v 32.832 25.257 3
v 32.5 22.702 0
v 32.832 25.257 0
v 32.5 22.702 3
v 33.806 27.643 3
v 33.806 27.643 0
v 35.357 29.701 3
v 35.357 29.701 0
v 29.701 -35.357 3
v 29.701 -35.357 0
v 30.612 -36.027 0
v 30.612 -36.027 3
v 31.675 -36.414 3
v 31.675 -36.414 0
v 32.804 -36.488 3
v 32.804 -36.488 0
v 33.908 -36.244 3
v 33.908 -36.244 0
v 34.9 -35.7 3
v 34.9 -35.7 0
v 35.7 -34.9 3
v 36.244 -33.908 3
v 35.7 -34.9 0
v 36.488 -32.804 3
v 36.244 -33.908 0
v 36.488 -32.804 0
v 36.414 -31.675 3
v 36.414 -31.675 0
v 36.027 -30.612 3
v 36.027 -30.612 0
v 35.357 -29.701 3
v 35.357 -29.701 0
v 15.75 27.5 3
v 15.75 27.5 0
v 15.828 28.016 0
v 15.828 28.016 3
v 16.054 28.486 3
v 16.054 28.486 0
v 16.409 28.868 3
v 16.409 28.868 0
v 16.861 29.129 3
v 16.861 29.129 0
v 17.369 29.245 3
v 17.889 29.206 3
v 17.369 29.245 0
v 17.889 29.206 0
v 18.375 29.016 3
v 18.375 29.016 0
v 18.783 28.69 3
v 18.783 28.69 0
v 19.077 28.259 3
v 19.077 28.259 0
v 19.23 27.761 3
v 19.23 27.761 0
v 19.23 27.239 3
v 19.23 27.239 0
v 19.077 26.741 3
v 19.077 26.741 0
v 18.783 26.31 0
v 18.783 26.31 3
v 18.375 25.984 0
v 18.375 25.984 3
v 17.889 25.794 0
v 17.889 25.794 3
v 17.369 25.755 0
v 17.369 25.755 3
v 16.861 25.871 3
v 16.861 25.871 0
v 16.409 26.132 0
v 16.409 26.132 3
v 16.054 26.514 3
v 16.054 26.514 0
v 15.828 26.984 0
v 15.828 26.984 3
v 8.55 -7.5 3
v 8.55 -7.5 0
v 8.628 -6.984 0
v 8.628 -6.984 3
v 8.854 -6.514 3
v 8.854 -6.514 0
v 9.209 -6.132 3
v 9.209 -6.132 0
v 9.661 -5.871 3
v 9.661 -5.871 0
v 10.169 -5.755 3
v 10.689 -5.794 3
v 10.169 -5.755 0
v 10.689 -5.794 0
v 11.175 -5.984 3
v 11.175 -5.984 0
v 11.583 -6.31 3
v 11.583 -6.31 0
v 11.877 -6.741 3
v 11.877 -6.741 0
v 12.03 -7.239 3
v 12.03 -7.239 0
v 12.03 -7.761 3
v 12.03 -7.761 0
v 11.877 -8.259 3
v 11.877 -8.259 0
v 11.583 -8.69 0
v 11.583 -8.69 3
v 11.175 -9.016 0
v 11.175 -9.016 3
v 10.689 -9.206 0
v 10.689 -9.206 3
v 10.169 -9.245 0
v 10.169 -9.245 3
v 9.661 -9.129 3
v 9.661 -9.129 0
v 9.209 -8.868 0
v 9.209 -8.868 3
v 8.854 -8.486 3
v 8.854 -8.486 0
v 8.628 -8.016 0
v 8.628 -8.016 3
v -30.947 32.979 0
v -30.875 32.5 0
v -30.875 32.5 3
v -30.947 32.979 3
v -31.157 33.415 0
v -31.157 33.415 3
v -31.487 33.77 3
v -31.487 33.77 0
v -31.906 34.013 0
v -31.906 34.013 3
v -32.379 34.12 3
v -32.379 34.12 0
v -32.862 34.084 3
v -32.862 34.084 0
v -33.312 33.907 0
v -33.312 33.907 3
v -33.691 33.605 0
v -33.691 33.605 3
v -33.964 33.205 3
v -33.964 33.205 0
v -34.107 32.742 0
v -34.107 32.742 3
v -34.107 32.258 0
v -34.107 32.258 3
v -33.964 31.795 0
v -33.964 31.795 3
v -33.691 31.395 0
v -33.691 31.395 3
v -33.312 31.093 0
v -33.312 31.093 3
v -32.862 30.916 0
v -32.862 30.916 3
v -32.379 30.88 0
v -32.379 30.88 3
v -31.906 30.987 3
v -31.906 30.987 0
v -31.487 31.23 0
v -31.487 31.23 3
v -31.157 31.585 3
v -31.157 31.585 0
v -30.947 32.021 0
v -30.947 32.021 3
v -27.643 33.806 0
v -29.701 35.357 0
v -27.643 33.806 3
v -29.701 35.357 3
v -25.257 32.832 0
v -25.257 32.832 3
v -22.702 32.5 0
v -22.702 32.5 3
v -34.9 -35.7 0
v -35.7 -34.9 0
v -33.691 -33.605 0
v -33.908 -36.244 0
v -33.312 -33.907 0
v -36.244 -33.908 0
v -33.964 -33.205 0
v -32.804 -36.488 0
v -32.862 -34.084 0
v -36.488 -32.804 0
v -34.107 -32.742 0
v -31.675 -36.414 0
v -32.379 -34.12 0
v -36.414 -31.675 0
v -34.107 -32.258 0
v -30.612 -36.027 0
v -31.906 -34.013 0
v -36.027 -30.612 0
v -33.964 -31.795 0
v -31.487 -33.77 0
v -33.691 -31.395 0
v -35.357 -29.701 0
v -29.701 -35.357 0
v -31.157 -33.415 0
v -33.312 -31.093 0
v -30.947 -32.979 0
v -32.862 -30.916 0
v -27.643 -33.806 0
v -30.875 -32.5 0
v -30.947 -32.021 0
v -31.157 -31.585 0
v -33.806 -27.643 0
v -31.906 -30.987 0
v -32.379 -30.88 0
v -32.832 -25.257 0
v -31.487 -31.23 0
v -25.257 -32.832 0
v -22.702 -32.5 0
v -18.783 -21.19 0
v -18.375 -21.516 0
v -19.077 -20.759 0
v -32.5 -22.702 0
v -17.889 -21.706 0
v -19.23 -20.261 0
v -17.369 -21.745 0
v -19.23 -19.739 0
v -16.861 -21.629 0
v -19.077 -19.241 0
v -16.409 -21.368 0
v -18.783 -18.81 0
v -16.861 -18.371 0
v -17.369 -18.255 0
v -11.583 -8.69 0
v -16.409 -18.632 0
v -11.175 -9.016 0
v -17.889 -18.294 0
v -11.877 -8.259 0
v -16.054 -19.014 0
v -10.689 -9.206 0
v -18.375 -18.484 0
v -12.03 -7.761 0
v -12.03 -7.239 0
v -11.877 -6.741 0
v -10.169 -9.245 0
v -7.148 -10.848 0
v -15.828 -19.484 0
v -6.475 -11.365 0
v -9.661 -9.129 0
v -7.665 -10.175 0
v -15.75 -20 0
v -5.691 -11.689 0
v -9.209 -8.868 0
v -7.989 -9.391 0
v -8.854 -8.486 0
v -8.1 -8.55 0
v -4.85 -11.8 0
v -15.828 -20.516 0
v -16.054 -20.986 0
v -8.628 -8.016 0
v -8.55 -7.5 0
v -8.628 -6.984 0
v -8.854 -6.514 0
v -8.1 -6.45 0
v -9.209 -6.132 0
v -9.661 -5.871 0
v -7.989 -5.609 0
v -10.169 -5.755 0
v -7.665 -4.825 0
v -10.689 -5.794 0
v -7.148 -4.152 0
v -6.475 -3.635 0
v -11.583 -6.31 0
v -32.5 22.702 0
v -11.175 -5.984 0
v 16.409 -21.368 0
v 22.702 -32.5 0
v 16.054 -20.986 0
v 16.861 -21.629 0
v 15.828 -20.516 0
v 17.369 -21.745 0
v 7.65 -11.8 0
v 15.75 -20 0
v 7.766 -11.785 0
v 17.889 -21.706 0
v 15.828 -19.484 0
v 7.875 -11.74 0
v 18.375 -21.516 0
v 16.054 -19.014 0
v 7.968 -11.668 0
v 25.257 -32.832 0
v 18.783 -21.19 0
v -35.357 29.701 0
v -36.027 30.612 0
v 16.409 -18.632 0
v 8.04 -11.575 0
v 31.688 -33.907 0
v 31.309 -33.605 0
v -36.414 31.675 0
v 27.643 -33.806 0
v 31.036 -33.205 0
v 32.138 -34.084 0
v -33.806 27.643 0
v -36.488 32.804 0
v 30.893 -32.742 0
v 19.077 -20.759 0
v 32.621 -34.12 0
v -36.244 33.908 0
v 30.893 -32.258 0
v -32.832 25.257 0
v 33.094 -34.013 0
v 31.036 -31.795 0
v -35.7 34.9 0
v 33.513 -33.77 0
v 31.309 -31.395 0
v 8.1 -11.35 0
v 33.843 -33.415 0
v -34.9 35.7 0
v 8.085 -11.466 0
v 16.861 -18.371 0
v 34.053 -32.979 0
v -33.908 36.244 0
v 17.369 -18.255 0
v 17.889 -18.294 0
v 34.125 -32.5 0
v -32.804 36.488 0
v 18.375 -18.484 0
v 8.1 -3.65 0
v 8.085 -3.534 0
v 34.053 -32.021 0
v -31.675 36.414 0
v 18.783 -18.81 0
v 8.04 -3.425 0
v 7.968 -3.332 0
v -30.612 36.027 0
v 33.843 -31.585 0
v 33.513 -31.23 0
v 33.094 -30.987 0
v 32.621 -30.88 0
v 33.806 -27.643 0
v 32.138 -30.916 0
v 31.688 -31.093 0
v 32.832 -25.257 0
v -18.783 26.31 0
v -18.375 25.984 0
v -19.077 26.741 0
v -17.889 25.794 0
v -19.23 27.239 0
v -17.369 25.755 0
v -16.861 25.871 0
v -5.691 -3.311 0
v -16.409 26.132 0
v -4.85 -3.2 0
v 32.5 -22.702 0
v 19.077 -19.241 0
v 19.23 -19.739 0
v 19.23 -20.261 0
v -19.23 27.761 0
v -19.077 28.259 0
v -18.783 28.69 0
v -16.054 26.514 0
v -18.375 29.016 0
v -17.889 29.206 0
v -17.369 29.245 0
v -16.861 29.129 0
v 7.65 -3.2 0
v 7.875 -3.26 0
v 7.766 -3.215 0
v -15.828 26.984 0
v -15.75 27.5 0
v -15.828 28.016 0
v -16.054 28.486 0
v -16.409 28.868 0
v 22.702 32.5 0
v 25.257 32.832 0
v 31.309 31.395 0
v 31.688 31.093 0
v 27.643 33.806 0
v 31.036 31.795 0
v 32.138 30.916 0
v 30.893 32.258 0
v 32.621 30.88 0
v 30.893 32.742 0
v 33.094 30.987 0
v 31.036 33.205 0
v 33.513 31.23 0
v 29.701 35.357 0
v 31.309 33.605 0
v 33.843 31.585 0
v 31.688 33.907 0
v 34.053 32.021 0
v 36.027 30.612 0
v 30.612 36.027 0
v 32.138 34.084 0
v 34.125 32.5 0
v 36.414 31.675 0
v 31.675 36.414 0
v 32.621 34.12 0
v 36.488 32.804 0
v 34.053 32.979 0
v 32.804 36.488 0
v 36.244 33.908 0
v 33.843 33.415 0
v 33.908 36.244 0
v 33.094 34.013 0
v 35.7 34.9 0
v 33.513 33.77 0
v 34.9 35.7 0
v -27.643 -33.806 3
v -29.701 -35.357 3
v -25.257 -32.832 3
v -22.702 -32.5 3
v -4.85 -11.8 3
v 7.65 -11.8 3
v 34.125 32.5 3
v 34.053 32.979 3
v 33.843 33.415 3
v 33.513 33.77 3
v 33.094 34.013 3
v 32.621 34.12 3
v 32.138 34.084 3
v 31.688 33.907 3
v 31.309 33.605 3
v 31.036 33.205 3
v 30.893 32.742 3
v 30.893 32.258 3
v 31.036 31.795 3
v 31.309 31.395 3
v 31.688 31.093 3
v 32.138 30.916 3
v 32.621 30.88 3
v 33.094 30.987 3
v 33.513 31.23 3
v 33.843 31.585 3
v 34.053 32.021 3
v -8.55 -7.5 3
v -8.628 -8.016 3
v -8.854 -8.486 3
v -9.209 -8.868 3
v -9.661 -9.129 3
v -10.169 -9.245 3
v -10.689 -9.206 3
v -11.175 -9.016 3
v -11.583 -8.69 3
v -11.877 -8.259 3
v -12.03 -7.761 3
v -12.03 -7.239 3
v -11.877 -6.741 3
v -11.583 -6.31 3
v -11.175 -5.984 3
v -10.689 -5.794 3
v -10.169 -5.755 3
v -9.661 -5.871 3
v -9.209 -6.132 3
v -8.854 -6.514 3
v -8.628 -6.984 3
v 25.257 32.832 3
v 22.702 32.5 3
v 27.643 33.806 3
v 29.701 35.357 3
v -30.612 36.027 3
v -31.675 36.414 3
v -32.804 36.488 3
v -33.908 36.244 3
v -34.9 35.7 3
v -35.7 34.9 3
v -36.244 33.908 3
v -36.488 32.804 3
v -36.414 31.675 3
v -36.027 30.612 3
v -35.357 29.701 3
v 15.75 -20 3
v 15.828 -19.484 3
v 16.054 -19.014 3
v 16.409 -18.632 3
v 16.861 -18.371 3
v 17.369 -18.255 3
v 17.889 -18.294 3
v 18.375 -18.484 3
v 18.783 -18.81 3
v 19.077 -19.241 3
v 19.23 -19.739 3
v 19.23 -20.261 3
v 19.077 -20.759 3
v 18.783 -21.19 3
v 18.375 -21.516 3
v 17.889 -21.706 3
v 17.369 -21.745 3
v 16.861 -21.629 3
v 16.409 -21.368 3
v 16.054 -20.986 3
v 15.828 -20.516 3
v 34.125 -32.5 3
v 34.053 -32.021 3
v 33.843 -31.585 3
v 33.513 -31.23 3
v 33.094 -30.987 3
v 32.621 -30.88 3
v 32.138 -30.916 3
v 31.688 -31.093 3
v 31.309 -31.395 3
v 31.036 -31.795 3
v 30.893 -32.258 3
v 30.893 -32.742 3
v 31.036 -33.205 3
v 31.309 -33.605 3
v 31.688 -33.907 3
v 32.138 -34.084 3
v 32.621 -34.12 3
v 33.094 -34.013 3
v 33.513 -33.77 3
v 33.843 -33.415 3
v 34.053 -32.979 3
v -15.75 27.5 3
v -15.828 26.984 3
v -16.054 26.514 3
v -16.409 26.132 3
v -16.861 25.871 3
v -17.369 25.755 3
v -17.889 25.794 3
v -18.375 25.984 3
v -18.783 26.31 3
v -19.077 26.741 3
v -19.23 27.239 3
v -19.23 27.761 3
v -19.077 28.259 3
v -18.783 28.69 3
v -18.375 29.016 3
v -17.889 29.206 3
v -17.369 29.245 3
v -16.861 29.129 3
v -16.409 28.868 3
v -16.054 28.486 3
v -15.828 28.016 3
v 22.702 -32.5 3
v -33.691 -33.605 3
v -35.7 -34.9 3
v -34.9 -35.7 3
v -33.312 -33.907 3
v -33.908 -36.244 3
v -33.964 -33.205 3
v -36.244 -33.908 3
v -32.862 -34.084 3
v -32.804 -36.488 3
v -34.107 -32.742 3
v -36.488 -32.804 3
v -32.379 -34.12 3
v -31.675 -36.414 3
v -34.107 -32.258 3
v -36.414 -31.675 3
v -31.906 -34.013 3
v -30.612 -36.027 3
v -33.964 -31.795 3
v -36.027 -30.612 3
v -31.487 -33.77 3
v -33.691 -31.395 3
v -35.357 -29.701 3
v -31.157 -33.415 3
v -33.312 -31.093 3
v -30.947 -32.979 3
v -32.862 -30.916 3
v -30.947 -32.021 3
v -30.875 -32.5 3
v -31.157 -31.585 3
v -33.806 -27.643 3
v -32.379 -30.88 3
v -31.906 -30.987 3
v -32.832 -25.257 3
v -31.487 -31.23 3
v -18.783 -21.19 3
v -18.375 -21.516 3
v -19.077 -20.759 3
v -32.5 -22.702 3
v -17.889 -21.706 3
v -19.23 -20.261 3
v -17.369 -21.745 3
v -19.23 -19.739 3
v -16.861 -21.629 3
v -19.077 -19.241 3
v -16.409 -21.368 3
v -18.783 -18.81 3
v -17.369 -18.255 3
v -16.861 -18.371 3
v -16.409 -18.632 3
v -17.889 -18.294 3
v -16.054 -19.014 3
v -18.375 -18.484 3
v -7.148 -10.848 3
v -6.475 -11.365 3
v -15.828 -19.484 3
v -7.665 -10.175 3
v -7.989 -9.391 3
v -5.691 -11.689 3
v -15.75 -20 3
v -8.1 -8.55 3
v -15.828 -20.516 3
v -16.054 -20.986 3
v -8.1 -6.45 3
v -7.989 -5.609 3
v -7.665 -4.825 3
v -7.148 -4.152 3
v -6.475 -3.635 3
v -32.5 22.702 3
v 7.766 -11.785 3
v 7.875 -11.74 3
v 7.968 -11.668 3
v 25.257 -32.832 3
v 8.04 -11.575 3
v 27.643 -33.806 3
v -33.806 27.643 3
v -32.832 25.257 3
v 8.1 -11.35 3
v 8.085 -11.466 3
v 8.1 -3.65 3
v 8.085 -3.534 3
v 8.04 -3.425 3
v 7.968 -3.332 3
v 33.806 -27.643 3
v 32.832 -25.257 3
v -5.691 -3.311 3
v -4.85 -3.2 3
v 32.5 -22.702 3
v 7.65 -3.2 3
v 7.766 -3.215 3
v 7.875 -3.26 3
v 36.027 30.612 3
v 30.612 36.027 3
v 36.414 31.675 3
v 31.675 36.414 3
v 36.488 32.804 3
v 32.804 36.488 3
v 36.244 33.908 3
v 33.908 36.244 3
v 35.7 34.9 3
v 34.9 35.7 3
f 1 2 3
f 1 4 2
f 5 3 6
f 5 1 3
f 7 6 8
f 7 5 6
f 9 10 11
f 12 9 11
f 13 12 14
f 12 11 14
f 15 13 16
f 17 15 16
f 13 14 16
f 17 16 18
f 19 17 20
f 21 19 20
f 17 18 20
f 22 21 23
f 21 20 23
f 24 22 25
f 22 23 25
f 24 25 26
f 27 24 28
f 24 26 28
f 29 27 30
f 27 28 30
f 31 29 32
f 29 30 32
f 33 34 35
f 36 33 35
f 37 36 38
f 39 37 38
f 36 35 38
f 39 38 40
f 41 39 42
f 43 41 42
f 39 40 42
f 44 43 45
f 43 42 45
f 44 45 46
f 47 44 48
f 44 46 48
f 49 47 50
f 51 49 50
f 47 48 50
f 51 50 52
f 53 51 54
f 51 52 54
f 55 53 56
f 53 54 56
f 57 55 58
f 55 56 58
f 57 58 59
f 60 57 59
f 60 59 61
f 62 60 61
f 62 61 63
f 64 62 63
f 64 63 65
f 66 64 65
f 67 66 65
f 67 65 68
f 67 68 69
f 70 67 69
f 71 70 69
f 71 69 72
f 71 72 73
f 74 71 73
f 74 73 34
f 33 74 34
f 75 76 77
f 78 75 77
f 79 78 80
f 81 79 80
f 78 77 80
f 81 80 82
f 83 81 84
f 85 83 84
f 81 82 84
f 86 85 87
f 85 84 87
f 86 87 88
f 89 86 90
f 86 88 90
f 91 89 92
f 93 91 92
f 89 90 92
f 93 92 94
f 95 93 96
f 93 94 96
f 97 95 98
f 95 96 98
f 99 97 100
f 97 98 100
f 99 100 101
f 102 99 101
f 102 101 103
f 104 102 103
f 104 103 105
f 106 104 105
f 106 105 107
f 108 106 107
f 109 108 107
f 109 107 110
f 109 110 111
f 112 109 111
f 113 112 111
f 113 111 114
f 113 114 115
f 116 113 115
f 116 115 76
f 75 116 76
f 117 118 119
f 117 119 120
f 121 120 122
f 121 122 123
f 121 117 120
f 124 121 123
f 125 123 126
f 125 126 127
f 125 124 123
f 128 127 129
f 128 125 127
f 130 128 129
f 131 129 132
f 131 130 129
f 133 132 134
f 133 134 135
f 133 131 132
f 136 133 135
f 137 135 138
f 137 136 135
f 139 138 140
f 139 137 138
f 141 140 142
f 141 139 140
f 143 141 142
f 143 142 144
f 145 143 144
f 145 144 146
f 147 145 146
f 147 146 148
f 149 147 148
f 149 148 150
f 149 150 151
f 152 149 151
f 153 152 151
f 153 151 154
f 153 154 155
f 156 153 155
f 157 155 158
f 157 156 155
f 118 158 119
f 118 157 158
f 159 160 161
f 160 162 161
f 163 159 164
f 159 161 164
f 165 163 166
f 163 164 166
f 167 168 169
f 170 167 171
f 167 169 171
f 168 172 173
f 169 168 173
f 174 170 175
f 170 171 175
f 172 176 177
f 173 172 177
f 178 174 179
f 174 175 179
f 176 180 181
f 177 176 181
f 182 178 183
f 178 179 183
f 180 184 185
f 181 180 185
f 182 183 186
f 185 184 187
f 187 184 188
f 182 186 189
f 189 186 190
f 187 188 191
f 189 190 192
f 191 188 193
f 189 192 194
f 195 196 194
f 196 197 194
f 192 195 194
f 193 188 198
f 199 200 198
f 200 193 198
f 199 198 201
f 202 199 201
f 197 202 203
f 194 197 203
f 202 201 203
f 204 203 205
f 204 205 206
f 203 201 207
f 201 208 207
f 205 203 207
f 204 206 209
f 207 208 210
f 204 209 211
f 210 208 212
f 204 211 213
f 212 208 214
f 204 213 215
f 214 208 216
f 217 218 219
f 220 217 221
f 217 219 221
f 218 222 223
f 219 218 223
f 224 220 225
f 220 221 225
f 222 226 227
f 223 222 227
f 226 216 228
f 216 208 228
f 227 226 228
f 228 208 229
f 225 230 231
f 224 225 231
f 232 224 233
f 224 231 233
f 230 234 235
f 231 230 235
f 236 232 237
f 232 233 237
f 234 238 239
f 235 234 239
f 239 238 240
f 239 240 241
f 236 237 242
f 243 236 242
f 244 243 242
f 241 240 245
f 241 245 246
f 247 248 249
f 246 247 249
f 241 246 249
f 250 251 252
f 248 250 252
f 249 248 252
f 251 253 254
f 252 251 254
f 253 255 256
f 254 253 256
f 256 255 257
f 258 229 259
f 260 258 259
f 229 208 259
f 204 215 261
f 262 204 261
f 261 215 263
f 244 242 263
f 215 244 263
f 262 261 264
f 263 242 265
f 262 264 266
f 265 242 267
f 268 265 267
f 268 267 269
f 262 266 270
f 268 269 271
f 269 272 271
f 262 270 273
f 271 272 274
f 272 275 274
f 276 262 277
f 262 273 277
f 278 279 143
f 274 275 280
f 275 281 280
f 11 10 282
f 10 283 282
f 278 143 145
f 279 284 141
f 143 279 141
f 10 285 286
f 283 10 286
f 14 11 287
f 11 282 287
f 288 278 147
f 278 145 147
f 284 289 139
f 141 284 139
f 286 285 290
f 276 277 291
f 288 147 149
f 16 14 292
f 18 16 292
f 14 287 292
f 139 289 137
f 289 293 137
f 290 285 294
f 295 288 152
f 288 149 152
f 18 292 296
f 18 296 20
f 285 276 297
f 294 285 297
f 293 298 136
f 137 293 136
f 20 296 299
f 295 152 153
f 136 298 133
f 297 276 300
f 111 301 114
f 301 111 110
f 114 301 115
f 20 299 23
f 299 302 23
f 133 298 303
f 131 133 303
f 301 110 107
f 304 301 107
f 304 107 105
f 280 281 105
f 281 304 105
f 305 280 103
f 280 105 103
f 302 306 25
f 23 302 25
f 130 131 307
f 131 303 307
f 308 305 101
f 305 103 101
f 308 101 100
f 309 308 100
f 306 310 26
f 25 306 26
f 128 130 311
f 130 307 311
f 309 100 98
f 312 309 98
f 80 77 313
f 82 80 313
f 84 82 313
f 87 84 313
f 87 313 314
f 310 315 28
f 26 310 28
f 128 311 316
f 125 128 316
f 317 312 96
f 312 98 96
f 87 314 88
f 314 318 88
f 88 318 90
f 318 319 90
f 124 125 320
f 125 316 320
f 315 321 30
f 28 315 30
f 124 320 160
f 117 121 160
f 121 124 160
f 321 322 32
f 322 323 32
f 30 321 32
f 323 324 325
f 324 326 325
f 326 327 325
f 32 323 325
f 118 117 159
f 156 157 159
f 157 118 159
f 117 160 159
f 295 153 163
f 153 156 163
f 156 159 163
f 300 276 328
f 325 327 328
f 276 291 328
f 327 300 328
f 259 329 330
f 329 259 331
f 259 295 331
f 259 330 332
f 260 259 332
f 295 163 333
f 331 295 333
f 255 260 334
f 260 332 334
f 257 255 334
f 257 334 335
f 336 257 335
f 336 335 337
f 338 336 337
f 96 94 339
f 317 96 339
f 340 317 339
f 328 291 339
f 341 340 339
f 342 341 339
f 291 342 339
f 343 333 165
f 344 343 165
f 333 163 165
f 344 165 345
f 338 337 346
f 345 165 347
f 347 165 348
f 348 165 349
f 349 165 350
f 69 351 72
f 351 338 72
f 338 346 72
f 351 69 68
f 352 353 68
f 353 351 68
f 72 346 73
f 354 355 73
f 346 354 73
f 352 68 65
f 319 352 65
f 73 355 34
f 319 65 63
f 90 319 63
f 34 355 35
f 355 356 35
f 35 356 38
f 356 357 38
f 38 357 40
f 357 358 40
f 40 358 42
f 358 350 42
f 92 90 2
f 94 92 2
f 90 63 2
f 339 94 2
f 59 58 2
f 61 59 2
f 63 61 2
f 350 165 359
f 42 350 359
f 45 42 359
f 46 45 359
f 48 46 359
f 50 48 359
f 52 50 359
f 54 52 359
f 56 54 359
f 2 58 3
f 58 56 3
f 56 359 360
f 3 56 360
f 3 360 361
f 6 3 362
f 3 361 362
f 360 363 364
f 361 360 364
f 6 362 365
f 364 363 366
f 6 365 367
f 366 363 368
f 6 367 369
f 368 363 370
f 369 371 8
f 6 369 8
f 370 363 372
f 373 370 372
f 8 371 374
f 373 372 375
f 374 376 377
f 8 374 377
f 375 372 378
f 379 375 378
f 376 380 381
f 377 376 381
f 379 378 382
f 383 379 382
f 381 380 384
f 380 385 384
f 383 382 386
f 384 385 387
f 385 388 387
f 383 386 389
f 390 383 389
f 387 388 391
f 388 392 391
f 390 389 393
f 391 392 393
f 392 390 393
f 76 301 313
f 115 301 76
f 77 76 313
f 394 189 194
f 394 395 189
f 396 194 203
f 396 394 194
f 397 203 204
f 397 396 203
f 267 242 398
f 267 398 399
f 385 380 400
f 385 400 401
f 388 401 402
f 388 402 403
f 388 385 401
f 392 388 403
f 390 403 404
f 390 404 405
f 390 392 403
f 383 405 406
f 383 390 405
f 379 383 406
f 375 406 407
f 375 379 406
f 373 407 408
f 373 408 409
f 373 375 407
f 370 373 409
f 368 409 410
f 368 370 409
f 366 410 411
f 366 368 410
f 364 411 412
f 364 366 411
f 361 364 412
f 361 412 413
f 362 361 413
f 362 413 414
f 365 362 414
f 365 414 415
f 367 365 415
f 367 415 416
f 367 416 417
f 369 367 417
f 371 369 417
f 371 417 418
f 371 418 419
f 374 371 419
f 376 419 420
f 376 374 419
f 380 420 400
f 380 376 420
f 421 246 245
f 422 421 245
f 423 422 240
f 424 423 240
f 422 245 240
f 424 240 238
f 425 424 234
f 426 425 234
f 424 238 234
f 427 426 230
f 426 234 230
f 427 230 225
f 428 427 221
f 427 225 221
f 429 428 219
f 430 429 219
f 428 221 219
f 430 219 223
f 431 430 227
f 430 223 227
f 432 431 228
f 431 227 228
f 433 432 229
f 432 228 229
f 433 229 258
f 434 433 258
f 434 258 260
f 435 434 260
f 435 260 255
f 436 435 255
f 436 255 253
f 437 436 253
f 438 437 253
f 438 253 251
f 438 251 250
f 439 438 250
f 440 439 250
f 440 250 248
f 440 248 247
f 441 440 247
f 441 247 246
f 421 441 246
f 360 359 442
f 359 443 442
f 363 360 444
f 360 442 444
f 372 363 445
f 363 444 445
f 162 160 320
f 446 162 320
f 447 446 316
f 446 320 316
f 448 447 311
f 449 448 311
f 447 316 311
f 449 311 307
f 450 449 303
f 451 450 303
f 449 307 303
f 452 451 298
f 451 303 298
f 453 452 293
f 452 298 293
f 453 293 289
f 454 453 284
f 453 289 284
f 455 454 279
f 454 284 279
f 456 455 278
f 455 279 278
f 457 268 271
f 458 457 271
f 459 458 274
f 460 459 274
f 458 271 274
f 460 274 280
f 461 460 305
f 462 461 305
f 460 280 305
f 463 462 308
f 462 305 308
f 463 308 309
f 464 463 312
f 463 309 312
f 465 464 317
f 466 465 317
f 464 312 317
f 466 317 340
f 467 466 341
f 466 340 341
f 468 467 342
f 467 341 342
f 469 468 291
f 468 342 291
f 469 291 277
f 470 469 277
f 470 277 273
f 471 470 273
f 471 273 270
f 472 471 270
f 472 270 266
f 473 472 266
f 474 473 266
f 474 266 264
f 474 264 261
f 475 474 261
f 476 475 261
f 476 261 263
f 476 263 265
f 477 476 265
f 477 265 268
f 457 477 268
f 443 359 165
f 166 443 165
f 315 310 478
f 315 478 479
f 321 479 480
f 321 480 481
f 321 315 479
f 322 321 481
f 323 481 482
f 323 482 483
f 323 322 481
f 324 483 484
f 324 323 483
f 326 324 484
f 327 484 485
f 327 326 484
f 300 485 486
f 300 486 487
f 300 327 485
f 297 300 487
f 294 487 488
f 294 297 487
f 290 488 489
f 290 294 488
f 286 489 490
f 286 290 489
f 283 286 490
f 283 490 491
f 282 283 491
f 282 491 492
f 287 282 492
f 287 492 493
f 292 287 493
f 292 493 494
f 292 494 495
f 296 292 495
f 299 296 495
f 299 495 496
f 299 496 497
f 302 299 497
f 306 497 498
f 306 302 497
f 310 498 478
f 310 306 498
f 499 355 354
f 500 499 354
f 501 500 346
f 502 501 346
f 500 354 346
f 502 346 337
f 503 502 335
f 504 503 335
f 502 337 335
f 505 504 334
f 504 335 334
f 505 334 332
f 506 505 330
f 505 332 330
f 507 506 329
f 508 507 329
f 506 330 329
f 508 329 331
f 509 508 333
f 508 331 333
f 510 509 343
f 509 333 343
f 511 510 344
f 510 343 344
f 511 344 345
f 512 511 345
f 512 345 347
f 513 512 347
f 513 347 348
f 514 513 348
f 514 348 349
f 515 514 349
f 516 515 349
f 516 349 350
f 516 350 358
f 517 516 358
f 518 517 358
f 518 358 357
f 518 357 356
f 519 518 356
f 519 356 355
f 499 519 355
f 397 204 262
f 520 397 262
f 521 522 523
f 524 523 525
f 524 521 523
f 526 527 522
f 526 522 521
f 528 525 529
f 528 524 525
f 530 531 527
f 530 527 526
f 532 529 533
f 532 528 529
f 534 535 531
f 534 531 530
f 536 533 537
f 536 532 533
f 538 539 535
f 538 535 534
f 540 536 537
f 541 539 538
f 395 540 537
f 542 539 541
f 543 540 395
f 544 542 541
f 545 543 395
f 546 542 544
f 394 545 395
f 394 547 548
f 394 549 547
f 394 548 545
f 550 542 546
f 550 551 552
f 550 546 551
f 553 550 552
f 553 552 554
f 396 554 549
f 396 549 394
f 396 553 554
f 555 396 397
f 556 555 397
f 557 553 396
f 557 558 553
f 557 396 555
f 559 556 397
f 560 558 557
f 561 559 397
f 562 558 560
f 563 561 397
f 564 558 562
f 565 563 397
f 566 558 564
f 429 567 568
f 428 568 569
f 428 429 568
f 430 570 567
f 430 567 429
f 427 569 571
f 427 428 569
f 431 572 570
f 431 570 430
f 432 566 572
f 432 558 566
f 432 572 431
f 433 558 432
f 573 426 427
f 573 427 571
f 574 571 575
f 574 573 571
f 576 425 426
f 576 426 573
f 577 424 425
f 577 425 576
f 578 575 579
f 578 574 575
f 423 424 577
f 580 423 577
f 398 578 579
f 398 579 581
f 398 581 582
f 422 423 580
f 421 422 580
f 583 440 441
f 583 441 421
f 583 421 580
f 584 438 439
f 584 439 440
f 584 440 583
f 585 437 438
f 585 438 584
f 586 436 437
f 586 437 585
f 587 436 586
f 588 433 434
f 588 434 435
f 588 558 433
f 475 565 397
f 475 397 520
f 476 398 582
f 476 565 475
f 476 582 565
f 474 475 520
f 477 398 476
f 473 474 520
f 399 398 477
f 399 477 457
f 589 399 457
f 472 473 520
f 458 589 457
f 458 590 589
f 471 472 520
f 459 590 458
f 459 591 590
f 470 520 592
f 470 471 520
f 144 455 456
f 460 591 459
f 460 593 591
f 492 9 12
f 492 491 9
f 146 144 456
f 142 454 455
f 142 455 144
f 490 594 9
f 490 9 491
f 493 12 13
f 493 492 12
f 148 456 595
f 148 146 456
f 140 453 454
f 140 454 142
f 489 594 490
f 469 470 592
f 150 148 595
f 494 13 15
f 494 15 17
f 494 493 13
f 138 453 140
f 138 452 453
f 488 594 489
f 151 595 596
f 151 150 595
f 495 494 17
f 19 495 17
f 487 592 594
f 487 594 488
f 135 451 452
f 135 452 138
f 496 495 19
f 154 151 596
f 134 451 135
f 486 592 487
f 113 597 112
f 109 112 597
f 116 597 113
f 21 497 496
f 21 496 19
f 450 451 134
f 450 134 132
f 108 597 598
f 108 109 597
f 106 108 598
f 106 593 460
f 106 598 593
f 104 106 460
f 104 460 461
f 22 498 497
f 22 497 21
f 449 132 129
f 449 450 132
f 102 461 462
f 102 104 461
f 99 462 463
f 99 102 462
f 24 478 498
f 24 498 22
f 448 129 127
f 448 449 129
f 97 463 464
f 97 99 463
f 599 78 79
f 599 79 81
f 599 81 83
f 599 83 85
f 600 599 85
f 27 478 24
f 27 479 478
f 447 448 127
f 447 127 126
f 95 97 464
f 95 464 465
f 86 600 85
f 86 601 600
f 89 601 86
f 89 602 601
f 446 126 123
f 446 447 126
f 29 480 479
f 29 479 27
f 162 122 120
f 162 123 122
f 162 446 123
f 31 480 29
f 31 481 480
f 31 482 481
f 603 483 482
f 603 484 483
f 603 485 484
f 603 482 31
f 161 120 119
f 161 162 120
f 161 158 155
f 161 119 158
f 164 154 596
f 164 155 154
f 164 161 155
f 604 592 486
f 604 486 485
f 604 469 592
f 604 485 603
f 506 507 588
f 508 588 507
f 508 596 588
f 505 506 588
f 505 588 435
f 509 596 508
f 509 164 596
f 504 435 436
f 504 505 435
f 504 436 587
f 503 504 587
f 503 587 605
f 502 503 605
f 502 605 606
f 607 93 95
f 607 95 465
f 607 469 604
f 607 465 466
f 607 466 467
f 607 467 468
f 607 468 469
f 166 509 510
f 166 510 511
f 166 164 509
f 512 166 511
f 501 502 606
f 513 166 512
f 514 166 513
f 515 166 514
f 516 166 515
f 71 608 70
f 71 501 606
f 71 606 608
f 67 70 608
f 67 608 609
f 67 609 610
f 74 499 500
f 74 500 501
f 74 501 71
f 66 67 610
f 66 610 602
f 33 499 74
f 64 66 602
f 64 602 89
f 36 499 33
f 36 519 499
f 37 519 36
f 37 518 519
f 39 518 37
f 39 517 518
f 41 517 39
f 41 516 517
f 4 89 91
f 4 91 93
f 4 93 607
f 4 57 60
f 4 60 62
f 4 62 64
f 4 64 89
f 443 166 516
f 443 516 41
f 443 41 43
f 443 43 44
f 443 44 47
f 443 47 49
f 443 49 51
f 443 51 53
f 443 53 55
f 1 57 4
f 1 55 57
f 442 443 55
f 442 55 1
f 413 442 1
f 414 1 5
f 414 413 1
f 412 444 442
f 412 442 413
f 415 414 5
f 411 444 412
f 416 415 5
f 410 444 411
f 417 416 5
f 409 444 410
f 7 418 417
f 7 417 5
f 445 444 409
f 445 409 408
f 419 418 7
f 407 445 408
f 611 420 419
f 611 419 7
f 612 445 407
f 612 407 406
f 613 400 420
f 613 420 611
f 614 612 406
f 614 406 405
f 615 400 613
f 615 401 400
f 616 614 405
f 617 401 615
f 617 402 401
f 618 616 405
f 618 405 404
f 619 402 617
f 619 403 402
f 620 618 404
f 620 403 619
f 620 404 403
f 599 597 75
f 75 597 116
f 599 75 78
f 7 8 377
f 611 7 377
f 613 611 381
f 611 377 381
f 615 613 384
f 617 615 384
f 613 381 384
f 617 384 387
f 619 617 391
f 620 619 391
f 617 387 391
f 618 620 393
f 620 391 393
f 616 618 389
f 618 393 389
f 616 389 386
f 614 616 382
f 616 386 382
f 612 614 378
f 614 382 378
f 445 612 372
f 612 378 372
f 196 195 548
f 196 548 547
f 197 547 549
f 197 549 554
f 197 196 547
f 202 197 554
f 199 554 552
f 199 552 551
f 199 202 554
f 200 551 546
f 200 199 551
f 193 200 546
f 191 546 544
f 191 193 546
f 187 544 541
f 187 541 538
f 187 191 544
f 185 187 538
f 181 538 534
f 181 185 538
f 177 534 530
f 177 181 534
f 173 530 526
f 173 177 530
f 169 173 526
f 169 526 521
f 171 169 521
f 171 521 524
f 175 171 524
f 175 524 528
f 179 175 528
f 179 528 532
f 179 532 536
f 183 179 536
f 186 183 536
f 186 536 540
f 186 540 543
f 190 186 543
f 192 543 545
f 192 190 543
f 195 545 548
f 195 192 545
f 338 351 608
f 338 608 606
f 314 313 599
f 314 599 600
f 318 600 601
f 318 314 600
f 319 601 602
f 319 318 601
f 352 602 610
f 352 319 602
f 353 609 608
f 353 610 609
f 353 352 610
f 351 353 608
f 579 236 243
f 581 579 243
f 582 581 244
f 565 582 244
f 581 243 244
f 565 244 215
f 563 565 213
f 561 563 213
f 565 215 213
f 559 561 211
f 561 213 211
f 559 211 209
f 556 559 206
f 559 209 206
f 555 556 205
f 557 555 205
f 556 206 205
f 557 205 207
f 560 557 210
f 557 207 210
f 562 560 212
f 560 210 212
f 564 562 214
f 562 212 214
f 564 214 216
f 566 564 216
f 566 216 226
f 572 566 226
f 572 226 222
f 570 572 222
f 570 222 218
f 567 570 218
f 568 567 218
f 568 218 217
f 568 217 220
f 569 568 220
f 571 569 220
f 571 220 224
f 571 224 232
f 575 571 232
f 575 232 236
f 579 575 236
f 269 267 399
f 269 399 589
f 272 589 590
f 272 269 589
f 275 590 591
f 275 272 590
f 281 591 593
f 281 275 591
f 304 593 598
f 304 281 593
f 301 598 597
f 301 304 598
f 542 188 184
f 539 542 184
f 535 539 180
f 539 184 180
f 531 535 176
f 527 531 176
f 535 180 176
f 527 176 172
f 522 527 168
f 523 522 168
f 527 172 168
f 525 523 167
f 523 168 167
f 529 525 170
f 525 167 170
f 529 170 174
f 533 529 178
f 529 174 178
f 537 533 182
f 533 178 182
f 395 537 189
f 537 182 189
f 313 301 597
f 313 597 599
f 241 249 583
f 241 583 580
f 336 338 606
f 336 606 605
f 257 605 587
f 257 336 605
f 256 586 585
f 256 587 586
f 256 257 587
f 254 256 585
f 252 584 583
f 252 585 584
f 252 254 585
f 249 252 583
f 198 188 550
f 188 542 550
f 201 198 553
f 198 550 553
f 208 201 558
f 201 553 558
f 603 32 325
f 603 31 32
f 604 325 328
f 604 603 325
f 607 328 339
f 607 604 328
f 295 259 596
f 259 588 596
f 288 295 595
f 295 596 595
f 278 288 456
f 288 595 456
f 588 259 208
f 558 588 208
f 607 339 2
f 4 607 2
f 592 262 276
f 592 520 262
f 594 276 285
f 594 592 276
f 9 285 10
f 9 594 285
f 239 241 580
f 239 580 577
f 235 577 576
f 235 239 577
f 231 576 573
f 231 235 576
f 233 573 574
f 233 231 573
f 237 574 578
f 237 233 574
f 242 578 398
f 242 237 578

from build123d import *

# Parameters (mm, degrees)
SKETCH_1_R          = 1.625
EXTRUDE_1_DEPTH     = 3
FILLET_1_R          = 10
SKETCH_3_R          = 1.75
CUT_EXTRUDE_1_DEPTH = 10
SKETCH_4_R          = 1.75
CUT_EXTRUDE_2_DEPTH = 10
SKETCH_5_R          = 1.75
CUT_EXTRUDE_3_DEPTH = 10
CUT_EXTRUDE_4_DEPTH = 10


with BuildPart() as part:
    # Эскиз1 → Бобышка-Вытянуть1 (new body)
    with BuildSketch(Plane.XY):
        with BuildLine():
            ThreePointArc((-32.5, -28.5), (-35.328427125, -35.328427125), (-28.5, -32.5))
            Line((-28.5, -32.5), (28.5, -32.5))
            ThreePointArc((28.5, -32.5), (35.328427125, -35.328427125), (32.5, -28.5))
            Line((32.5, -28.5), (32.5, 28.5))
            ThreePointArc((32.5, 28.5), (35.328427125, 35.328427125), (28.5, 32.5))
            Line((28.5, 32.5), (-28.5, 32.5))
            ThreePointArc((-28.5, 32.5), (-35.328427125, 35.328427125), (-32.5, 28.5))
            Line((-32.5, 28.5), (-32.5, -28.5))
        make_face()
        with Locations((-32.5, -32.5)):
            Circle(SKETCH_1_R, mode=Mode.SUBTRACT)
        with Locations((32.5, 32.5)):
            Circle(SKETCH_1_R, mode=Mode.SUBTRACT)
        with Locations((-32.5, 32.5)):
            Circle(SKETCH_1_R, mode=Mode.SUBTRACT)
        with Locations((32.5, -32.5)):
            Circle(SKETCH_1_R, mode=Mode.SUBTRACT)
    extrude(amount=EXTRUDE_1_DEPTH)

    # Скругление1
    fillet_1_edges = [part.edges().sort_by_distance(p)[0] for p in [
        (-32.5, -28.5, 1.5),
        (-32.5, 28.5, 1.5),
        (-28.5, 32.5, 1.5),
        (28.5, 32.5, 1.5),
        (32.5, 28.5, 1.5),
        (32.5, -28.5, 1.5),
        (28.5, -32.5, 1.5),
        (-28.5, -32.5, 1.5),
    ]]
    fillet(fillet_1_edges, radius=FILLET_1_R)

    # Эскиз3 → Вырез-Вытянуть1 (cut)
    with BuildSketch(Plane(origin=(0, 0, 0), x_dir=(-1, 0, 0), z_dir=(0, 0, -1))):
        with Locations((-17.5, 27.5)):
            Circle(SKETCH_3_R)
        with Locations(Location((17.5, 27.5, 0), (0, 0, 180))):
            Circle(SKETCH_3_R)
    extrude(amount=-CUT_EXTRUDE_1_DEPTH, mode=Mode.SUBTRACT)

    # Эскиз4 → Вырез-Вытянуть2 (cut)
    with BuildSketch(Plane(origin=(0, 0, 0), x_dir=(-1, 0, 0), z_dir=(0, 0, -1))):
        with Locations((-17.5, -20)):
            Circle(SKETCH_4_R)
        with Locations(Location((17.5, -20, 0), (0, 0, 180))):
            Circle(SKETCH_4_R)
    extrude(amount=-CUT_EXTRUDE_2_DEPTH, mode=Mode.SUBTRACT)

    # Эскиз5 → Вырез-Вытянуть3 (cut)
    with BuildSketch(Plane(origin=(0, 0, 0), x_dir=(-1, 0, 0), z_dir=(0, 0, -1))):
        with Locations((-10.3, -7.5)):
            Circle(SKETCH_5_R)
        with Locations(Location((10.3, -7.5, 0), (0, 0, 180))):
            Circle(SKETCH_5_R)
    extrude(amount=-CUT_EXTRUDE_3_DEPTH, mode=Mode.SUBTRACT)

    # Эскиз7 → Вырез-Вытянуть4 (cut)
    # profile 1 of 2: a face of its own
    with BuildSketch(Plane(origin=(0, 0, 0), x_dir=(-1, 0, 0), z_dir=(0, 0, -1))):
        with BuildLine():
            Line((-7.65, -3.2), (4.85, -3.2))
            ThreePointArc((4.85, -3.2), (7.148097039, -4.151902961), (8.1, -6.45))
            Line((8.1, -6.45), (8.1, -8.55))
            ThreePointArc((8.1, -8.55), (7.148097039, -10.848097039), (4.85, -11.8))
            Line((4.85, -11.8), (-7.65, -11.8))
            ThreePointArc((-7.65, -11.8), (-7.968198052, -11.668198052), (-8.1, -11.35))
            Line((-8.1, -11.35), (-8.1, -3.65))
            ThreePointArc((-8.1, -3.65), (-7.968198052, -3.331801948), (-7.65, -3.2))
        make_face()
        with BuildLine():
            ThreePointArc((-7.85, -11.35), (-7.791421356, -11.491421356), (-7.65, -11.55))
            Line((-7.65, -11.55), (4.85, -11.55))
            ThreePointArc((4.85, -11.55), (6.971320344, -10.671320344), (7.85, -8.55))
            Line((7.85, -8.55), (7.85, -6.45))
            ThreePointArc((7.85, -6.45), (6.971320344, -4.328679656), (4.85, -3.45))
            Line((4.85, -3.45), (-7.65, -3.45))
            ThreePointArc((-7.65, -3.45), (-7.791421356, -3.508578644), (-7.85, -3.65))
            Line((-7.85, -3.65), (-7.85, -11.35))
        make_face(mode=Mode.SUBTRACT)
    # profile 2 of 2: a face of its own
    with BuildSketch(Plane(origin=(0, 0, 0), x_dir=(-1, 0, 0), z_dir=(0, 0, -1))):
        with BuildLine():
            Line((-7.85, -3.65), (-7.85, -11.35))
            ThreePointArc((-7.85, -11.35), (-7.791421356, -11.491421356), (-7.65, -11.55))
            Line((-7.65, -11.55), (4.85, -11.55))
            ThreePointArc((4.85, -11.55), (6.971320344, -10.671320344), (7.85, -8.55))
            Line((7.85, -8.55), (7.85, -6.45))
            ThreePointArc((7.85, -6.45), (6.971320344, -4.328679656), (4.85, -3.45))
            Line((4.85, -3.45), (-7.65, -3.45))
            ThreePointArc((-7.65, -3.45), (-7.791421356, -3.508578644), (-7.85, -3.65))
        make_face()
    extrude(amount=-CUT_EXTRUDE_4_DEPTH, mode=Mode.SUBTRACT)


solid = part.part
